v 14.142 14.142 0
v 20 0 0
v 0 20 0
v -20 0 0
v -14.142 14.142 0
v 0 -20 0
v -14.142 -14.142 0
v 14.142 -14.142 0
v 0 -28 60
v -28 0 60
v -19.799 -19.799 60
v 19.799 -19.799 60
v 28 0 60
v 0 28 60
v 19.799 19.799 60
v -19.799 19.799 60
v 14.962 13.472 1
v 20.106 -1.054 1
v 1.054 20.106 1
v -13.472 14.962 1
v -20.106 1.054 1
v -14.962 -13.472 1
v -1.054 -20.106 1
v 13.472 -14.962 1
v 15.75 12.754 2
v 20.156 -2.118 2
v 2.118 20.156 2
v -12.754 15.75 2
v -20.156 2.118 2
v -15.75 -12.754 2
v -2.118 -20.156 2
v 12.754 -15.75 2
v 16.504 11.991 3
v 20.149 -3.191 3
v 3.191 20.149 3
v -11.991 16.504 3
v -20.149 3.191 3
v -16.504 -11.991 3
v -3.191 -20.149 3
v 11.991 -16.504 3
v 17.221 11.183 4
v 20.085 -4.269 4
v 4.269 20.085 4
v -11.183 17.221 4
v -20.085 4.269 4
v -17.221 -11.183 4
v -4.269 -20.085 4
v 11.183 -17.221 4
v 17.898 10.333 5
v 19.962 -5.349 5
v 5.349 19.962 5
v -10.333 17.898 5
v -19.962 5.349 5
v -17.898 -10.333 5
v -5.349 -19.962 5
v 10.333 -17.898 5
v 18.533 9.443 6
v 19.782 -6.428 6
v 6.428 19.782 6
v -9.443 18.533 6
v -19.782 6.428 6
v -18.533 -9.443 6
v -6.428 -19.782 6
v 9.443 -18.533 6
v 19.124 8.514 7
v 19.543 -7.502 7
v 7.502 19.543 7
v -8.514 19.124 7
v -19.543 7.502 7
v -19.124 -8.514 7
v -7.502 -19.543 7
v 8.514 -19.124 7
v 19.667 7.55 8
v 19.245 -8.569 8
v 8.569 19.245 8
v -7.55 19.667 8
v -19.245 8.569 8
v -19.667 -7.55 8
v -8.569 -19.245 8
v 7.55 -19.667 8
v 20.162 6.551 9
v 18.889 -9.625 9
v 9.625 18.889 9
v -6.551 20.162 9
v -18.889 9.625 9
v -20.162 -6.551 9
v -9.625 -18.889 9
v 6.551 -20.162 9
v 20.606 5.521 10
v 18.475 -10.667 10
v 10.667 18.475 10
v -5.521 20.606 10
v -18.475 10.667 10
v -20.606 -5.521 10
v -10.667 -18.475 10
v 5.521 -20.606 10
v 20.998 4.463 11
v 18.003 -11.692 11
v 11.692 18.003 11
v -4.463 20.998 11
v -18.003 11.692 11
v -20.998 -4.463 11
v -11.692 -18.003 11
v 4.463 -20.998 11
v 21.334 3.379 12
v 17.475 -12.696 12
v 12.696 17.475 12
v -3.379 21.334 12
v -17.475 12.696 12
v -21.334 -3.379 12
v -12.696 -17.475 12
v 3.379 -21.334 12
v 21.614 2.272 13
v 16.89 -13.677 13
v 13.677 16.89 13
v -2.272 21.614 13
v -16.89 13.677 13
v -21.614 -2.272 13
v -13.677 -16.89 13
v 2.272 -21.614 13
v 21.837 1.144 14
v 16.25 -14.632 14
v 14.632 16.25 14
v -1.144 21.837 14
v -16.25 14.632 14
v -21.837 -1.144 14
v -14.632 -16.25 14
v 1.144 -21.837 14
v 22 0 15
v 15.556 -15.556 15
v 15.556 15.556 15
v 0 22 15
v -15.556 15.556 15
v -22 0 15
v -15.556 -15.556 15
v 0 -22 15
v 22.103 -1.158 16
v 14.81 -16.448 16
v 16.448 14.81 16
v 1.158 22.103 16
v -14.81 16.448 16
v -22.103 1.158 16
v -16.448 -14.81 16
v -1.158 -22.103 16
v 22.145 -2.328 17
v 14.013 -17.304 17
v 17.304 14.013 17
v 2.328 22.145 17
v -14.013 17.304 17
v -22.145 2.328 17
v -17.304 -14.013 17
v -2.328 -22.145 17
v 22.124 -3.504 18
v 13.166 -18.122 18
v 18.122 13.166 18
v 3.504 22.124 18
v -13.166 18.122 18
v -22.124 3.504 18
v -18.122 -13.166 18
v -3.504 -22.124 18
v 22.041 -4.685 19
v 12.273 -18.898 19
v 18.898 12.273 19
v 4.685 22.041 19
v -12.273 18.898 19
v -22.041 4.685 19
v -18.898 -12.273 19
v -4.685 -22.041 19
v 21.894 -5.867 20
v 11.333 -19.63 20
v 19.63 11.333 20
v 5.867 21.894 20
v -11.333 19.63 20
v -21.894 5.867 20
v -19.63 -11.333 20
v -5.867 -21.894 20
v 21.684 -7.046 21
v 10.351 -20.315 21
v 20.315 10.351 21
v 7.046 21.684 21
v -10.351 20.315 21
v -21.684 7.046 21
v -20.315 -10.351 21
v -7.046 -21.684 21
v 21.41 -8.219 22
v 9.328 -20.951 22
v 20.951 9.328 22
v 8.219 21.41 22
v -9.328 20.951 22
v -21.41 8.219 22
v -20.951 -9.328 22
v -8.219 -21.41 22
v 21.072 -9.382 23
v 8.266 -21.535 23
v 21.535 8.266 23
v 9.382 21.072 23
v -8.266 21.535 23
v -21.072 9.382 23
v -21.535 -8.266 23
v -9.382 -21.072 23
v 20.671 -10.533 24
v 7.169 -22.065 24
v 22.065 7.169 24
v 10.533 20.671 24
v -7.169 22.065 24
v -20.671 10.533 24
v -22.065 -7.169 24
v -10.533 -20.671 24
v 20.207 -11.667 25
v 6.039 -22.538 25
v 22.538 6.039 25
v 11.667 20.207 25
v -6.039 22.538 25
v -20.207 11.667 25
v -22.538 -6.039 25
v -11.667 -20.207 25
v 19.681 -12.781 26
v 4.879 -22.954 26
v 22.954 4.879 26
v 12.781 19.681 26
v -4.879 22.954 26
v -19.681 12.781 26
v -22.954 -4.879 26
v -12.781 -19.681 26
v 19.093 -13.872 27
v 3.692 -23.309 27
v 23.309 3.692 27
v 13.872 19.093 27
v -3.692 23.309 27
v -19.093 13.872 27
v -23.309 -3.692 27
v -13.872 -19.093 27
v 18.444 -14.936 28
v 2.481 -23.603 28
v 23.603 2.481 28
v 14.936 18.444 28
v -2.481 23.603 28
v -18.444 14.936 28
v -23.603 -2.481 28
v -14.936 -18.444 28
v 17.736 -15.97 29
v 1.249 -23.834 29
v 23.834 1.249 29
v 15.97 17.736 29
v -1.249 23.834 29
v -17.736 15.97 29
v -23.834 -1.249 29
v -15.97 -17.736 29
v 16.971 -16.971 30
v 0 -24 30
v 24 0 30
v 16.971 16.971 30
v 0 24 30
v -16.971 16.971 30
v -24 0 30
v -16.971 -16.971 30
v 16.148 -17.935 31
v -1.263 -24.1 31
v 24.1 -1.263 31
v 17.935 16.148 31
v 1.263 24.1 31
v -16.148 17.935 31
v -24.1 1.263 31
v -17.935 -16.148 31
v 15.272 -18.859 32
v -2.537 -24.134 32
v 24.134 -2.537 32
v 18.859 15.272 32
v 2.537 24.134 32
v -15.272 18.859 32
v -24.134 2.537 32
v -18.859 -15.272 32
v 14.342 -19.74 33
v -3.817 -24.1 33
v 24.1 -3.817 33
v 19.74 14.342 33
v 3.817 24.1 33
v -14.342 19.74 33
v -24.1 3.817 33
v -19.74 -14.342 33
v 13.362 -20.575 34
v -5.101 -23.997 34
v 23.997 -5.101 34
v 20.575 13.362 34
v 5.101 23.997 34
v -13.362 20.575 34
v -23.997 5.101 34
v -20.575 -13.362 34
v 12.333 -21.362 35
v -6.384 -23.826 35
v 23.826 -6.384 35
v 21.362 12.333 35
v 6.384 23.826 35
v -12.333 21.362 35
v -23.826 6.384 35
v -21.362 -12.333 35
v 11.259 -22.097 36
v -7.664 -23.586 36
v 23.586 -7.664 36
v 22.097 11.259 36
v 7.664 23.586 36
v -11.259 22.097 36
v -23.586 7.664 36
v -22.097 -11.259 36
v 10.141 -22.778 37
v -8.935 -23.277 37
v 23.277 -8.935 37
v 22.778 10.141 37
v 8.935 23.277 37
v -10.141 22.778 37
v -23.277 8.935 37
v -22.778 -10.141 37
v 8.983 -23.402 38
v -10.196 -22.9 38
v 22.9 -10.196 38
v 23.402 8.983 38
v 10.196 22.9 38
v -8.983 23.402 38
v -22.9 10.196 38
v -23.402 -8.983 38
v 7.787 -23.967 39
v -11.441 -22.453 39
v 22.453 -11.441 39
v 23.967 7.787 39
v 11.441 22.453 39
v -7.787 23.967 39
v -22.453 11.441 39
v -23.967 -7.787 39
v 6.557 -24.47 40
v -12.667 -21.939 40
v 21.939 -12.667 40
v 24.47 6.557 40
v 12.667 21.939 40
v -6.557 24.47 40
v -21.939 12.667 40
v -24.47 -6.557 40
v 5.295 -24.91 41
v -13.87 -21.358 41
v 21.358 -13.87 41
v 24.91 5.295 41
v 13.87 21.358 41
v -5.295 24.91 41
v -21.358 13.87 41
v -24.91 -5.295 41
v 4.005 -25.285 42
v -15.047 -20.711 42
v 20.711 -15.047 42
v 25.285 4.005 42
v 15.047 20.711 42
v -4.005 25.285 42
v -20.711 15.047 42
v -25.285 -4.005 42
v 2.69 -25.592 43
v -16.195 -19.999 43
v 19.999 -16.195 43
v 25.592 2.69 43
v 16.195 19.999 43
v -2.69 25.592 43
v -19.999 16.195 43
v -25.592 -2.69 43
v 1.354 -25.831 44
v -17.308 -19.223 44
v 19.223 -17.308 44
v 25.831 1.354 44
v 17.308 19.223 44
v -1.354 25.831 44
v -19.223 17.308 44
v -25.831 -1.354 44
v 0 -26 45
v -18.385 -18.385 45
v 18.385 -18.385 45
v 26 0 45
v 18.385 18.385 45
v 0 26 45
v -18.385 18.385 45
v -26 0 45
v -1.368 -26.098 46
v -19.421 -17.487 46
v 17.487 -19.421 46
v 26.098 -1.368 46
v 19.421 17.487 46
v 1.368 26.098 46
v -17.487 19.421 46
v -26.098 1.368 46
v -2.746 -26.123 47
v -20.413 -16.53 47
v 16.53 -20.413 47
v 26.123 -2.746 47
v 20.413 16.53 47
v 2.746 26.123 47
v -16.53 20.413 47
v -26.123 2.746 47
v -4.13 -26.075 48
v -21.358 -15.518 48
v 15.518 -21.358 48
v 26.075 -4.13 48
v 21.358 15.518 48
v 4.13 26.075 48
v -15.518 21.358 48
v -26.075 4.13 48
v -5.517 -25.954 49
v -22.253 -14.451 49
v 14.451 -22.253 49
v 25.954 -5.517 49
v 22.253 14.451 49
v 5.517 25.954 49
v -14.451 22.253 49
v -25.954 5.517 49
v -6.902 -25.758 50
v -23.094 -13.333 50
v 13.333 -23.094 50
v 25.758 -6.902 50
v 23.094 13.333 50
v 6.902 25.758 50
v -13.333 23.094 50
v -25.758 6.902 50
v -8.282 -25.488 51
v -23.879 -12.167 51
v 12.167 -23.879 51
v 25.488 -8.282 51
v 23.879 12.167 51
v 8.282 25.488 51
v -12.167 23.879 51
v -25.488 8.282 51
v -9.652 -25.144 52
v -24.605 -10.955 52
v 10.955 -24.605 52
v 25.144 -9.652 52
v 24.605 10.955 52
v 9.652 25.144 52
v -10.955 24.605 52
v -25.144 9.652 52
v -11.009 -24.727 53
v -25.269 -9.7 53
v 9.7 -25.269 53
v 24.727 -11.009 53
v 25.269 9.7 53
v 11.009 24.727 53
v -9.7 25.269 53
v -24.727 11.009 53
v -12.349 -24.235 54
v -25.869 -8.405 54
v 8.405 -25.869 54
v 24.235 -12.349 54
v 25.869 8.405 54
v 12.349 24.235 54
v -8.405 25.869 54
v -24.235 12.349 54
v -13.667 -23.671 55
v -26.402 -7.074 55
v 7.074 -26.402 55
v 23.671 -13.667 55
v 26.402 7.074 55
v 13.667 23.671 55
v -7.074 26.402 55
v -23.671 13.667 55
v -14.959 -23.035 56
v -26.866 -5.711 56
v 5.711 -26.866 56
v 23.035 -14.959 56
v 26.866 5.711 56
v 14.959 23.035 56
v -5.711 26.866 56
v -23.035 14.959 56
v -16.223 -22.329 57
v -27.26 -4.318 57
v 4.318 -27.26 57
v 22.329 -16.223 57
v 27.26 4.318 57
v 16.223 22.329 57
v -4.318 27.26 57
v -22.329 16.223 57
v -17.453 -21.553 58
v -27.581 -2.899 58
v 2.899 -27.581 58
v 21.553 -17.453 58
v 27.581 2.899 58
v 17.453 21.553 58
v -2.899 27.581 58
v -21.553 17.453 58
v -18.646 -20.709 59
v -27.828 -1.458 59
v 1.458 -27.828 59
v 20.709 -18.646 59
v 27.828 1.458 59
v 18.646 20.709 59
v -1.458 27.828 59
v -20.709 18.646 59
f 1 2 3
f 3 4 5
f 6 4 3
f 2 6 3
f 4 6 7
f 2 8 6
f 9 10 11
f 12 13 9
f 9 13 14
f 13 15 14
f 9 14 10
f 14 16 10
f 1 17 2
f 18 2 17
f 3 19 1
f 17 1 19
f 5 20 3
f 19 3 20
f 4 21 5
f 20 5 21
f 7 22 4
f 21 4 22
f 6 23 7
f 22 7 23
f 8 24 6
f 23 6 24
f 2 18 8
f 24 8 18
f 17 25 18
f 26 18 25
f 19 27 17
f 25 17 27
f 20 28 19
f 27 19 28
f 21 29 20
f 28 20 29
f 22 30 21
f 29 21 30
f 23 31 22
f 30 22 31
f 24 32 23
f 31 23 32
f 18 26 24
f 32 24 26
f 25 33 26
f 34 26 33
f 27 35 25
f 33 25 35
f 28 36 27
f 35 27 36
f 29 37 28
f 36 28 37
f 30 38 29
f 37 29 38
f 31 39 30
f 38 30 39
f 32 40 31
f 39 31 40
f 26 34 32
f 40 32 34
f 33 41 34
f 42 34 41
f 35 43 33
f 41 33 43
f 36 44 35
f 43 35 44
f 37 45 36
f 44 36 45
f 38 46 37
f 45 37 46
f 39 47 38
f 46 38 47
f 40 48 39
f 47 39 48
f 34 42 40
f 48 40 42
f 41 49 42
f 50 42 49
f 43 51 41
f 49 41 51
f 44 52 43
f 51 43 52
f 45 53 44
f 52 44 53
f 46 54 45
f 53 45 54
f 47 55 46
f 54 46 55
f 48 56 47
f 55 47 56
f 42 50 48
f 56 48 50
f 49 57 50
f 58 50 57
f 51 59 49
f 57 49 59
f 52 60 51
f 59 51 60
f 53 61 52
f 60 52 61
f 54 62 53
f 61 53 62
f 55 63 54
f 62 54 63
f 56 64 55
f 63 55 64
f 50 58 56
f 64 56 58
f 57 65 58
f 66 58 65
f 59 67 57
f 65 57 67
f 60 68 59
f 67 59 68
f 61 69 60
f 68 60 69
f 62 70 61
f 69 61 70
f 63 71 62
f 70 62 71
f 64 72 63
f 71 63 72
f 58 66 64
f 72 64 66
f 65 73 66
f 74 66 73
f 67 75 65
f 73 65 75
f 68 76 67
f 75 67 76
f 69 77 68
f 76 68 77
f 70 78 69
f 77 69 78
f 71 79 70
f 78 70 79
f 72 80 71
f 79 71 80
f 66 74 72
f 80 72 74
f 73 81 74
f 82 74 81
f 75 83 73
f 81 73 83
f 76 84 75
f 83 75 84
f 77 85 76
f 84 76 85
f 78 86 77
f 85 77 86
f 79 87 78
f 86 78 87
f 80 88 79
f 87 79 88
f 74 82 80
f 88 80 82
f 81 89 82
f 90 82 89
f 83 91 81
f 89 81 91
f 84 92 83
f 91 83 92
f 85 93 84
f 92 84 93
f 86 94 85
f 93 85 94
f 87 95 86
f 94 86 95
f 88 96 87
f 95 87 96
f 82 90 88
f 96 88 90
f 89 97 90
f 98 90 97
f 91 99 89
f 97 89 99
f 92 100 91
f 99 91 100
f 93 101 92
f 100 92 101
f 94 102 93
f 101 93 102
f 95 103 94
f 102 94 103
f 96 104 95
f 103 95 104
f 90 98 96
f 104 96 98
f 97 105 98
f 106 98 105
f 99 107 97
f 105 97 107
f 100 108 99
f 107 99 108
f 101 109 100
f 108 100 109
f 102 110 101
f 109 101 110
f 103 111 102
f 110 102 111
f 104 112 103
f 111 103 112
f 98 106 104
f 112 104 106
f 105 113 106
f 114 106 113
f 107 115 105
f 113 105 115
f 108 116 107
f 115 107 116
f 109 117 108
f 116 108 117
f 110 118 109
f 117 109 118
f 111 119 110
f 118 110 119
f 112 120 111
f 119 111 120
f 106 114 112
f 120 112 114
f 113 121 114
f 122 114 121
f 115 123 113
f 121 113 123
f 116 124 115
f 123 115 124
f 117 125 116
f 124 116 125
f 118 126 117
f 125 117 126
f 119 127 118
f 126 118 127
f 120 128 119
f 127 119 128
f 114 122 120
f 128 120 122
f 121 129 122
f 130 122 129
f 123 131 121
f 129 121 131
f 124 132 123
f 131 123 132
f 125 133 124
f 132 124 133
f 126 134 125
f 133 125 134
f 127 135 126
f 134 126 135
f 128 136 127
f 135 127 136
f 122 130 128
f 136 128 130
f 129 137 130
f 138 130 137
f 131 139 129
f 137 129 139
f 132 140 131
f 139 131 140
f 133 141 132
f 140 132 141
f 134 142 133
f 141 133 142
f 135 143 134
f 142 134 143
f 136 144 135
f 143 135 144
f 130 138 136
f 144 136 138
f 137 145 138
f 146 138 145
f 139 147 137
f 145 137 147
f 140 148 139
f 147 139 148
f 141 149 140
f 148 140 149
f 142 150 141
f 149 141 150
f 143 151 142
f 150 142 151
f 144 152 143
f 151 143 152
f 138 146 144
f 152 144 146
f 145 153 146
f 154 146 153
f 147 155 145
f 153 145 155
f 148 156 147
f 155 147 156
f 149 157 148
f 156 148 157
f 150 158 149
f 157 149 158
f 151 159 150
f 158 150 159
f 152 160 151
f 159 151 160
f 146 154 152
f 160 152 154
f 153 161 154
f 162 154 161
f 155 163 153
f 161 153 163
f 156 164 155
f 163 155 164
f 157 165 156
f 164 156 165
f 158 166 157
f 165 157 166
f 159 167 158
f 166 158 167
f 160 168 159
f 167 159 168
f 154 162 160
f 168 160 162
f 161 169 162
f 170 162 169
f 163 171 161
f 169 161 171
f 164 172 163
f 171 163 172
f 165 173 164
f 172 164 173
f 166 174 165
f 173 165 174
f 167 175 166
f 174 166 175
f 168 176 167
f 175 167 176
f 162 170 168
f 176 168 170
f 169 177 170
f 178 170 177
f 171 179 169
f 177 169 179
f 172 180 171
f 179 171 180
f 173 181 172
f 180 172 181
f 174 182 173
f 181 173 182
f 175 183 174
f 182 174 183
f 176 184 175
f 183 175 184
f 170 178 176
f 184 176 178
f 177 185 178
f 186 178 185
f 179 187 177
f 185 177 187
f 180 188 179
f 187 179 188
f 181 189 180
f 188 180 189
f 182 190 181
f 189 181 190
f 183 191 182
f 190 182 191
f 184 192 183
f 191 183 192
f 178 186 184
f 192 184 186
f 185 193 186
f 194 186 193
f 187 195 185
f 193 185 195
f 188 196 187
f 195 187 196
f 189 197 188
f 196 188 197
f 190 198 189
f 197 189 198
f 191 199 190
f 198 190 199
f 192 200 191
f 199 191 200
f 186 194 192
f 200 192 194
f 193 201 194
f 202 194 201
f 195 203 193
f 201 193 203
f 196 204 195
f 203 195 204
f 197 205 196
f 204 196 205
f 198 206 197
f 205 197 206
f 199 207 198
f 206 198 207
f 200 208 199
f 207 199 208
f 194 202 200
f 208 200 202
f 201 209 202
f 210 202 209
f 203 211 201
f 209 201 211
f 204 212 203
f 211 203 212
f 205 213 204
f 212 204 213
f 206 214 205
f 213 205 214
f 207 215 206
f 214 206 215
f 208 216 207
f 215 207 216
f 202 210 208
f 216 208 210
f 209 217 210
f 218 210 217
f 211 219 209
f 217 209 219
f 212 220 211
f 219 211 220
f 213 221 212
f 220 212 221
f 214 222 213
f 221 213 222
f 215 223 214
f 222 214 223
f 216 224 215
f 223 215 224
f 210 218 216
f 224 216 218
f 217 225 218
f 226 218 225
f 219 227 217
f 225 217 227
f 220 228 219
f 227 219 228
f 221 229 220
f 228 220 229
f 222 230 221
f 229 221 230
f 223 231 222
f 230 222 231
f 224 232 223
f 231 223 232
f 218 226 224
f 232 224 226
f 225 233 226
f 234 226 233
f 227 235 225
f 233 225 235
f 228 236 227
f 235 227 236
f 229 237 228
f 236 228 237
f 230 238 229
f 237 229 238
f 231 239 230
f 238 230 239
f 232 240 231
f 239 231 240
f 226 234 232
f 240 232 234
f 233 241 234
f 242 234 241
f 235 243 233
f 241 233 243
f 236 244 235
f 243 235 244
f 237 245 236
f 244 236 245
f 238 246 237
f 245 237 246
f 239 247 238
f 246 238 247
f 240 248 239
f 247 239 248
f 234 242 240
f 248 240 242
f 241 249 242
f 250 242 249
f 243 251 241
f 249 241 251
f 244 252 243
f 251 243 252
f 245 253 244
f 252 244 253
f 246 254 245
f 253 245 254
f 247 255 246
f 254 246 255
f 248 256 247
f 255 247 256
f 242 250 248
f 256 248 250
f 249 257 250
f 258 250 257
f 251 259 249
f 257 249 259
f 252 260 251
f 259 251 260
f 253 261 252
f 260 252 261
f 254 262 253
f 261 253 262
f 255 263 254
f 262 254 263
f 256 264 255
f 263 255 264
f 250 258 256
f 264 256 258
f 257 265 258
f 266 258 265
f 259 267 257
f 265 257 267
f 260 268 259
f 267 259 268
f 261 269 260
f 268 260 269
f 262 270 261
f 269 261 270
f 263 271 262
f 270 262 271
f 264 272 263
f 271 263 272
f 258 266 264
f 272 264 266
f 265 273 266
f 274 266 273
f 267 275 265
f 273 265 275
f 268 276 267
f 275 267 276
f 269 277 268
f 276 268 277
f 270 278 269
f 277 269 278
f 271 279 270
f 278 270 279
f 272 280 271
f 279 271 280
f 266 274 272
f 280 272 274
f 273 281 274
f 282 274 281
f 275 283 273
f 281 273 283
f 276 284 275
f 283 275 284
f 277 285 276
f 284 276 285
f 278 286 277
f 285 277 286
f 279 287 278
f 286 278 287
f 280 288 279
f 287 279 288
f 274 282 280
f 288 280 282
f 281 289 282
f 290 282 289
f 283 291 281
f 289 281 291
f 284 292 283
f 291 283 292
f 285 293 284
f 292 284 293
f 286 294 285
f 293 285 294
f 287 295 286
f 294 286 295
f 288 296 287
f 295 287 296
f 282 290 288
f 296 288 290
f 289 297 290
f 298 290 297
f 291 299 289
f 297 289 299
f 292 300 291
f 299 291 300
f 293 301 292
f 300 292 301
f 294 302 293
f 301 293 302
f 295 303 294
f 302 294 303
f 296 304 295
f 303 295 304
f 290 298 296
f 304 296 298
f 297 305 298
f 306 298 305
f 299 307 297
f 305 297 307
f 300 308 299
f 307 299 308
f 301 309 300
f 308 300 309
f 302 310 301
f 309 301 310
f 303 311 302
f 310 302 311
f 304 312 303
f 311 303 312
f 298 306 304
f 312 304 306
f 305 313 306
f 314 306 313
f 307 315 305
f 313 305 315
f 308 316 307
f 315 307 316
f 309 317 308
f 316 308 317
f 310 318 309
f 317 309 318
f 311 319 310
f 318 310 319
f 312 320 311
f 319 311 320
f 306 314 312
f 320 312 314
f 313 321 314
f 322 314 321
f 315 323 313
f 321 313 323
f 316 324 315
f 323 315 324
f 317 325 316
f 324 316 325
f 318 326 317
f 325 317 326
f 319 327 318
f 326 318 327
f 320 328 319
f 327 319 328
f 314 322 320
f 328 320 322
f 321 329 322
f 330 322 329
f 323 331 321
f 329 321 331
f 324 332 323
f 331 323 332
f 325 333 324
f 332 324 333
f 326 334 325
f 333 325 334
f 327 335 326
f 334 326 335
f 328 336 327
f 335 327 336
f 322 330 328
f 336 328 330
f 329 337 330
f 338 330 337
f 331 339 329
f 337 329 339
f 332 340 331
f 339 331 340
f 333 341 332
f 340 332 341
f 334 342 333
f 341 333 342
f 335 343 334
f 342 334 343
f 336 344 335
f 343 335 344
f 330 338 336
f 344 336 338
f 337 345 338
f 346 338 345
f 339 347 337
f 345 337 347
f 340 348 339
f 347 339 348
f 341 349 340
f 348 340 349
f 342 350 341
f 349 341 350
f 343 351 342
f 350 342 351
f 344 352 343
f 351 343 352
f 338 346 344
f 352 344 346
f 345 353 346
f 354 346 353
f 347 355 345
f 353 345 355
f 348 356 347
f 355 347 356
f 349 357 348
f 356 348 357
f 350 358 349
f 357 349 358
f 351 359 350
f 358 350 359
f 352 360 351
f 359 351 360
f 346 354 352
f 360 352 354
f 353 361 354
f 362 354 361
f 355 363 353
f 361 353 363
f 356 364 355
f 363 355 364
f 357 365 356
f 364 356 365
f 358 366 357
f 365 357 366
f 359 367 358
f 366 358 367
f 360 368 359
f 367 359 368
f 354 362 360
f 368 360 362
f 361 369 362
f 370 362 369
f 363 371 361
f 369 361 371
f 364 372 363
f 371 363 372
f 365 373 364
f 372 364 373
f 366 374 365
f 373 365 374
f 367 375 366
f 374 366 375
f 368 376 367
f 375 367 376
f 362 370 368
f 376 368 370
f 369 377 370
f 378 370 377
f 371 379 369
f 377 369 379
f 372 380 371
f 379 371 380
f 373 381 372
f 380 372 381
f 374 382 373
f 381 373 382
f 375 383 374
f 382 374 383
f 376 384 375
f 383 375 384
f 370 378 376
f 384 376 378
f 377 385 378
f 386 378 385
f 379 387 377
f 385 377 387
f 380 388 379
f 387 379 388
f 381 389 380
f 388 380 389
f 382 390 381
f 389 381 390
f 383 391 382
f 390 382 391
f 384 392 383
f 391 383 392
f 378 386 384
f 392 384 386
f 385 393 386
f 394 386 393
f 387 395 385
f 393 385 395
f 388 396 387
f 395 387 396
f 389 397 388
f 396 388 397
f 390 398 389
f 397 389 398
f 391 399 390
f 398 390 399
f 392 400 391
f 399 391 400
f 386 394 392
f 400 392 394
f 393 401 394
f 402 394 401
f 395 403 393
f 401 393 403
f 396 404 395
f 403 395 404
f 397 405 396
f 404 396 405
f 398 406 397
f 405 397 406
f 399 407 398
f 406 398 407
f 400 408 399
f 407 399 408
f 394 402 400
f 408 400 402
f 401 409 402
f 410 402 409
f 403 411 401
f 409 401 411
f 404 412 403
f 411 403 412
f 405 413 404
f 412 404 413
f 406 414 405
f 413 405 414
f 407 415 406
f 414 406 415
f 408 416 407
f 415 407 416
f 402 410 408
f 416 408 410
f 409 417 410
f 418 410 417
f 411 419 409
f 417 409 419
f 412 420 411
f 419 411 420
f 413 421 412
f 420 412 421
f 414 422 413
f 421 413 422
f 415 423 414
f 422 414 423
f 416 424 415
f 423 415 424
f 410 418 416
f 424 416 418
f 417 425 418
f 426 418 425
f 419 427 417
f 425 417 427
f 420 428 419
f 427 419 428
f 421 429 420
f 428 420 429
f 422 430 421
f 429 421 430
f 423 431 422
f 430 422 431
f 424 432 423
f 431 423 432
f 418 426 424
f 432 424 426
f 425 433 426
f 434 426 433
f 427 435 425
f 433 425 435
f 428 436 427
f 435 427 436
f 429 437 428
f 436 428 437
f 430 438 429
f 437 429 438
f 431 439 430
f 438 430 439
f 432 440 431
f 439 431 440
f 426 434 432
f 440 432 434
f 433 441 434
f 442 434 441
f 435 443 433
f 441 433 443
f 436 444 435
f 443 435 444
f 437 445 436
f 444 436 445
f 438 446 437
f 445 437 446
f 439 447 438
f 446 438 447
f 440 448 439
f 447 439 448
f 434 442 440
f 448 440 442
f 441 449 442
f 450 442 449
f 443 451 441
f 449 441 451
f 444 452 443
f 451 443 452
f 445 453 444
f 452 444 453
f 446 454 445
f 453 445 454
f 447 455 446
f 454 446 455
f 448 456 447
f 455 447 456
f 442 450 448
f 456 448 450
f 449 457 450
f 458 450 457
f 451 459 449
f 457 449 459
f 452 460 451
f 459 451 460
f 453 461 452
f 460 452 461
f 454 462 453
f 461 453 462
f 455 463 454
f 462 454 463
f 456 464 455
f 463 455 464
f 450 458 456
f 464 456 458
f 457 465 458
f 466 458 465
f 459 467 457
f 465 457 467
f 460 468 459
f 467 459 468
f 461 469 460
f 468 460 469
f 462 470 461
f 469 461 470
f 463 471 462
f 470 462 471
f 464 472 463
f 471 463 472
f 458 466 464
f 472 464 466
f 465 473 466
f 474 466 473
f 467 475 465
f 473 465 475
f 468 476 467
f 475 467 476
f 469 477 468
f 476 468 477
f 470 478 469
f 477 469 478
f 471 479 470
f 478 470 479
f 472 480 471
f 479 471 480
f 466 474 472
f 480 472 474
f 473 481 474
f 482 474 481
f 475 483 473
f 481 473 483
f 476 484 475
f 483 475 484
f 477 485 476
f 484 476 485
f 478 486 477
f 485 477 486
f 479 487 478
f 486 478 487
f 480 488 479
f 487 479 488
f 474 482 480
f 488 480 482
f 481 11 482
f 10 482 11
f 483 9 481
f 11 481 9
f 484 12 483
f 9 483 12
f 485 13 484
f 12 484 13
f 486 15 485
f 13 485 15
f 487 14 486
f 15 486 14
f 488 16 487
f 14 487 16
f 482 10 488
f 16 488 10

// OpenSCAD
/* [Spiral Vase Parameters] */
height = 60; // [30:120]
base_radius = 20; // [10:50]
top_radius = 28; // [10:60]
twists = 180; // [0:360]
num_facets = 8; // [3:12]

// Generate spiral vase using linear_extrude with twist and scale
linear_extrude(height = height, twist = twists, scale = top_radius / base_radius, slices = 60) {
  circle(r = base_radius, $fn = num_facets);
}
